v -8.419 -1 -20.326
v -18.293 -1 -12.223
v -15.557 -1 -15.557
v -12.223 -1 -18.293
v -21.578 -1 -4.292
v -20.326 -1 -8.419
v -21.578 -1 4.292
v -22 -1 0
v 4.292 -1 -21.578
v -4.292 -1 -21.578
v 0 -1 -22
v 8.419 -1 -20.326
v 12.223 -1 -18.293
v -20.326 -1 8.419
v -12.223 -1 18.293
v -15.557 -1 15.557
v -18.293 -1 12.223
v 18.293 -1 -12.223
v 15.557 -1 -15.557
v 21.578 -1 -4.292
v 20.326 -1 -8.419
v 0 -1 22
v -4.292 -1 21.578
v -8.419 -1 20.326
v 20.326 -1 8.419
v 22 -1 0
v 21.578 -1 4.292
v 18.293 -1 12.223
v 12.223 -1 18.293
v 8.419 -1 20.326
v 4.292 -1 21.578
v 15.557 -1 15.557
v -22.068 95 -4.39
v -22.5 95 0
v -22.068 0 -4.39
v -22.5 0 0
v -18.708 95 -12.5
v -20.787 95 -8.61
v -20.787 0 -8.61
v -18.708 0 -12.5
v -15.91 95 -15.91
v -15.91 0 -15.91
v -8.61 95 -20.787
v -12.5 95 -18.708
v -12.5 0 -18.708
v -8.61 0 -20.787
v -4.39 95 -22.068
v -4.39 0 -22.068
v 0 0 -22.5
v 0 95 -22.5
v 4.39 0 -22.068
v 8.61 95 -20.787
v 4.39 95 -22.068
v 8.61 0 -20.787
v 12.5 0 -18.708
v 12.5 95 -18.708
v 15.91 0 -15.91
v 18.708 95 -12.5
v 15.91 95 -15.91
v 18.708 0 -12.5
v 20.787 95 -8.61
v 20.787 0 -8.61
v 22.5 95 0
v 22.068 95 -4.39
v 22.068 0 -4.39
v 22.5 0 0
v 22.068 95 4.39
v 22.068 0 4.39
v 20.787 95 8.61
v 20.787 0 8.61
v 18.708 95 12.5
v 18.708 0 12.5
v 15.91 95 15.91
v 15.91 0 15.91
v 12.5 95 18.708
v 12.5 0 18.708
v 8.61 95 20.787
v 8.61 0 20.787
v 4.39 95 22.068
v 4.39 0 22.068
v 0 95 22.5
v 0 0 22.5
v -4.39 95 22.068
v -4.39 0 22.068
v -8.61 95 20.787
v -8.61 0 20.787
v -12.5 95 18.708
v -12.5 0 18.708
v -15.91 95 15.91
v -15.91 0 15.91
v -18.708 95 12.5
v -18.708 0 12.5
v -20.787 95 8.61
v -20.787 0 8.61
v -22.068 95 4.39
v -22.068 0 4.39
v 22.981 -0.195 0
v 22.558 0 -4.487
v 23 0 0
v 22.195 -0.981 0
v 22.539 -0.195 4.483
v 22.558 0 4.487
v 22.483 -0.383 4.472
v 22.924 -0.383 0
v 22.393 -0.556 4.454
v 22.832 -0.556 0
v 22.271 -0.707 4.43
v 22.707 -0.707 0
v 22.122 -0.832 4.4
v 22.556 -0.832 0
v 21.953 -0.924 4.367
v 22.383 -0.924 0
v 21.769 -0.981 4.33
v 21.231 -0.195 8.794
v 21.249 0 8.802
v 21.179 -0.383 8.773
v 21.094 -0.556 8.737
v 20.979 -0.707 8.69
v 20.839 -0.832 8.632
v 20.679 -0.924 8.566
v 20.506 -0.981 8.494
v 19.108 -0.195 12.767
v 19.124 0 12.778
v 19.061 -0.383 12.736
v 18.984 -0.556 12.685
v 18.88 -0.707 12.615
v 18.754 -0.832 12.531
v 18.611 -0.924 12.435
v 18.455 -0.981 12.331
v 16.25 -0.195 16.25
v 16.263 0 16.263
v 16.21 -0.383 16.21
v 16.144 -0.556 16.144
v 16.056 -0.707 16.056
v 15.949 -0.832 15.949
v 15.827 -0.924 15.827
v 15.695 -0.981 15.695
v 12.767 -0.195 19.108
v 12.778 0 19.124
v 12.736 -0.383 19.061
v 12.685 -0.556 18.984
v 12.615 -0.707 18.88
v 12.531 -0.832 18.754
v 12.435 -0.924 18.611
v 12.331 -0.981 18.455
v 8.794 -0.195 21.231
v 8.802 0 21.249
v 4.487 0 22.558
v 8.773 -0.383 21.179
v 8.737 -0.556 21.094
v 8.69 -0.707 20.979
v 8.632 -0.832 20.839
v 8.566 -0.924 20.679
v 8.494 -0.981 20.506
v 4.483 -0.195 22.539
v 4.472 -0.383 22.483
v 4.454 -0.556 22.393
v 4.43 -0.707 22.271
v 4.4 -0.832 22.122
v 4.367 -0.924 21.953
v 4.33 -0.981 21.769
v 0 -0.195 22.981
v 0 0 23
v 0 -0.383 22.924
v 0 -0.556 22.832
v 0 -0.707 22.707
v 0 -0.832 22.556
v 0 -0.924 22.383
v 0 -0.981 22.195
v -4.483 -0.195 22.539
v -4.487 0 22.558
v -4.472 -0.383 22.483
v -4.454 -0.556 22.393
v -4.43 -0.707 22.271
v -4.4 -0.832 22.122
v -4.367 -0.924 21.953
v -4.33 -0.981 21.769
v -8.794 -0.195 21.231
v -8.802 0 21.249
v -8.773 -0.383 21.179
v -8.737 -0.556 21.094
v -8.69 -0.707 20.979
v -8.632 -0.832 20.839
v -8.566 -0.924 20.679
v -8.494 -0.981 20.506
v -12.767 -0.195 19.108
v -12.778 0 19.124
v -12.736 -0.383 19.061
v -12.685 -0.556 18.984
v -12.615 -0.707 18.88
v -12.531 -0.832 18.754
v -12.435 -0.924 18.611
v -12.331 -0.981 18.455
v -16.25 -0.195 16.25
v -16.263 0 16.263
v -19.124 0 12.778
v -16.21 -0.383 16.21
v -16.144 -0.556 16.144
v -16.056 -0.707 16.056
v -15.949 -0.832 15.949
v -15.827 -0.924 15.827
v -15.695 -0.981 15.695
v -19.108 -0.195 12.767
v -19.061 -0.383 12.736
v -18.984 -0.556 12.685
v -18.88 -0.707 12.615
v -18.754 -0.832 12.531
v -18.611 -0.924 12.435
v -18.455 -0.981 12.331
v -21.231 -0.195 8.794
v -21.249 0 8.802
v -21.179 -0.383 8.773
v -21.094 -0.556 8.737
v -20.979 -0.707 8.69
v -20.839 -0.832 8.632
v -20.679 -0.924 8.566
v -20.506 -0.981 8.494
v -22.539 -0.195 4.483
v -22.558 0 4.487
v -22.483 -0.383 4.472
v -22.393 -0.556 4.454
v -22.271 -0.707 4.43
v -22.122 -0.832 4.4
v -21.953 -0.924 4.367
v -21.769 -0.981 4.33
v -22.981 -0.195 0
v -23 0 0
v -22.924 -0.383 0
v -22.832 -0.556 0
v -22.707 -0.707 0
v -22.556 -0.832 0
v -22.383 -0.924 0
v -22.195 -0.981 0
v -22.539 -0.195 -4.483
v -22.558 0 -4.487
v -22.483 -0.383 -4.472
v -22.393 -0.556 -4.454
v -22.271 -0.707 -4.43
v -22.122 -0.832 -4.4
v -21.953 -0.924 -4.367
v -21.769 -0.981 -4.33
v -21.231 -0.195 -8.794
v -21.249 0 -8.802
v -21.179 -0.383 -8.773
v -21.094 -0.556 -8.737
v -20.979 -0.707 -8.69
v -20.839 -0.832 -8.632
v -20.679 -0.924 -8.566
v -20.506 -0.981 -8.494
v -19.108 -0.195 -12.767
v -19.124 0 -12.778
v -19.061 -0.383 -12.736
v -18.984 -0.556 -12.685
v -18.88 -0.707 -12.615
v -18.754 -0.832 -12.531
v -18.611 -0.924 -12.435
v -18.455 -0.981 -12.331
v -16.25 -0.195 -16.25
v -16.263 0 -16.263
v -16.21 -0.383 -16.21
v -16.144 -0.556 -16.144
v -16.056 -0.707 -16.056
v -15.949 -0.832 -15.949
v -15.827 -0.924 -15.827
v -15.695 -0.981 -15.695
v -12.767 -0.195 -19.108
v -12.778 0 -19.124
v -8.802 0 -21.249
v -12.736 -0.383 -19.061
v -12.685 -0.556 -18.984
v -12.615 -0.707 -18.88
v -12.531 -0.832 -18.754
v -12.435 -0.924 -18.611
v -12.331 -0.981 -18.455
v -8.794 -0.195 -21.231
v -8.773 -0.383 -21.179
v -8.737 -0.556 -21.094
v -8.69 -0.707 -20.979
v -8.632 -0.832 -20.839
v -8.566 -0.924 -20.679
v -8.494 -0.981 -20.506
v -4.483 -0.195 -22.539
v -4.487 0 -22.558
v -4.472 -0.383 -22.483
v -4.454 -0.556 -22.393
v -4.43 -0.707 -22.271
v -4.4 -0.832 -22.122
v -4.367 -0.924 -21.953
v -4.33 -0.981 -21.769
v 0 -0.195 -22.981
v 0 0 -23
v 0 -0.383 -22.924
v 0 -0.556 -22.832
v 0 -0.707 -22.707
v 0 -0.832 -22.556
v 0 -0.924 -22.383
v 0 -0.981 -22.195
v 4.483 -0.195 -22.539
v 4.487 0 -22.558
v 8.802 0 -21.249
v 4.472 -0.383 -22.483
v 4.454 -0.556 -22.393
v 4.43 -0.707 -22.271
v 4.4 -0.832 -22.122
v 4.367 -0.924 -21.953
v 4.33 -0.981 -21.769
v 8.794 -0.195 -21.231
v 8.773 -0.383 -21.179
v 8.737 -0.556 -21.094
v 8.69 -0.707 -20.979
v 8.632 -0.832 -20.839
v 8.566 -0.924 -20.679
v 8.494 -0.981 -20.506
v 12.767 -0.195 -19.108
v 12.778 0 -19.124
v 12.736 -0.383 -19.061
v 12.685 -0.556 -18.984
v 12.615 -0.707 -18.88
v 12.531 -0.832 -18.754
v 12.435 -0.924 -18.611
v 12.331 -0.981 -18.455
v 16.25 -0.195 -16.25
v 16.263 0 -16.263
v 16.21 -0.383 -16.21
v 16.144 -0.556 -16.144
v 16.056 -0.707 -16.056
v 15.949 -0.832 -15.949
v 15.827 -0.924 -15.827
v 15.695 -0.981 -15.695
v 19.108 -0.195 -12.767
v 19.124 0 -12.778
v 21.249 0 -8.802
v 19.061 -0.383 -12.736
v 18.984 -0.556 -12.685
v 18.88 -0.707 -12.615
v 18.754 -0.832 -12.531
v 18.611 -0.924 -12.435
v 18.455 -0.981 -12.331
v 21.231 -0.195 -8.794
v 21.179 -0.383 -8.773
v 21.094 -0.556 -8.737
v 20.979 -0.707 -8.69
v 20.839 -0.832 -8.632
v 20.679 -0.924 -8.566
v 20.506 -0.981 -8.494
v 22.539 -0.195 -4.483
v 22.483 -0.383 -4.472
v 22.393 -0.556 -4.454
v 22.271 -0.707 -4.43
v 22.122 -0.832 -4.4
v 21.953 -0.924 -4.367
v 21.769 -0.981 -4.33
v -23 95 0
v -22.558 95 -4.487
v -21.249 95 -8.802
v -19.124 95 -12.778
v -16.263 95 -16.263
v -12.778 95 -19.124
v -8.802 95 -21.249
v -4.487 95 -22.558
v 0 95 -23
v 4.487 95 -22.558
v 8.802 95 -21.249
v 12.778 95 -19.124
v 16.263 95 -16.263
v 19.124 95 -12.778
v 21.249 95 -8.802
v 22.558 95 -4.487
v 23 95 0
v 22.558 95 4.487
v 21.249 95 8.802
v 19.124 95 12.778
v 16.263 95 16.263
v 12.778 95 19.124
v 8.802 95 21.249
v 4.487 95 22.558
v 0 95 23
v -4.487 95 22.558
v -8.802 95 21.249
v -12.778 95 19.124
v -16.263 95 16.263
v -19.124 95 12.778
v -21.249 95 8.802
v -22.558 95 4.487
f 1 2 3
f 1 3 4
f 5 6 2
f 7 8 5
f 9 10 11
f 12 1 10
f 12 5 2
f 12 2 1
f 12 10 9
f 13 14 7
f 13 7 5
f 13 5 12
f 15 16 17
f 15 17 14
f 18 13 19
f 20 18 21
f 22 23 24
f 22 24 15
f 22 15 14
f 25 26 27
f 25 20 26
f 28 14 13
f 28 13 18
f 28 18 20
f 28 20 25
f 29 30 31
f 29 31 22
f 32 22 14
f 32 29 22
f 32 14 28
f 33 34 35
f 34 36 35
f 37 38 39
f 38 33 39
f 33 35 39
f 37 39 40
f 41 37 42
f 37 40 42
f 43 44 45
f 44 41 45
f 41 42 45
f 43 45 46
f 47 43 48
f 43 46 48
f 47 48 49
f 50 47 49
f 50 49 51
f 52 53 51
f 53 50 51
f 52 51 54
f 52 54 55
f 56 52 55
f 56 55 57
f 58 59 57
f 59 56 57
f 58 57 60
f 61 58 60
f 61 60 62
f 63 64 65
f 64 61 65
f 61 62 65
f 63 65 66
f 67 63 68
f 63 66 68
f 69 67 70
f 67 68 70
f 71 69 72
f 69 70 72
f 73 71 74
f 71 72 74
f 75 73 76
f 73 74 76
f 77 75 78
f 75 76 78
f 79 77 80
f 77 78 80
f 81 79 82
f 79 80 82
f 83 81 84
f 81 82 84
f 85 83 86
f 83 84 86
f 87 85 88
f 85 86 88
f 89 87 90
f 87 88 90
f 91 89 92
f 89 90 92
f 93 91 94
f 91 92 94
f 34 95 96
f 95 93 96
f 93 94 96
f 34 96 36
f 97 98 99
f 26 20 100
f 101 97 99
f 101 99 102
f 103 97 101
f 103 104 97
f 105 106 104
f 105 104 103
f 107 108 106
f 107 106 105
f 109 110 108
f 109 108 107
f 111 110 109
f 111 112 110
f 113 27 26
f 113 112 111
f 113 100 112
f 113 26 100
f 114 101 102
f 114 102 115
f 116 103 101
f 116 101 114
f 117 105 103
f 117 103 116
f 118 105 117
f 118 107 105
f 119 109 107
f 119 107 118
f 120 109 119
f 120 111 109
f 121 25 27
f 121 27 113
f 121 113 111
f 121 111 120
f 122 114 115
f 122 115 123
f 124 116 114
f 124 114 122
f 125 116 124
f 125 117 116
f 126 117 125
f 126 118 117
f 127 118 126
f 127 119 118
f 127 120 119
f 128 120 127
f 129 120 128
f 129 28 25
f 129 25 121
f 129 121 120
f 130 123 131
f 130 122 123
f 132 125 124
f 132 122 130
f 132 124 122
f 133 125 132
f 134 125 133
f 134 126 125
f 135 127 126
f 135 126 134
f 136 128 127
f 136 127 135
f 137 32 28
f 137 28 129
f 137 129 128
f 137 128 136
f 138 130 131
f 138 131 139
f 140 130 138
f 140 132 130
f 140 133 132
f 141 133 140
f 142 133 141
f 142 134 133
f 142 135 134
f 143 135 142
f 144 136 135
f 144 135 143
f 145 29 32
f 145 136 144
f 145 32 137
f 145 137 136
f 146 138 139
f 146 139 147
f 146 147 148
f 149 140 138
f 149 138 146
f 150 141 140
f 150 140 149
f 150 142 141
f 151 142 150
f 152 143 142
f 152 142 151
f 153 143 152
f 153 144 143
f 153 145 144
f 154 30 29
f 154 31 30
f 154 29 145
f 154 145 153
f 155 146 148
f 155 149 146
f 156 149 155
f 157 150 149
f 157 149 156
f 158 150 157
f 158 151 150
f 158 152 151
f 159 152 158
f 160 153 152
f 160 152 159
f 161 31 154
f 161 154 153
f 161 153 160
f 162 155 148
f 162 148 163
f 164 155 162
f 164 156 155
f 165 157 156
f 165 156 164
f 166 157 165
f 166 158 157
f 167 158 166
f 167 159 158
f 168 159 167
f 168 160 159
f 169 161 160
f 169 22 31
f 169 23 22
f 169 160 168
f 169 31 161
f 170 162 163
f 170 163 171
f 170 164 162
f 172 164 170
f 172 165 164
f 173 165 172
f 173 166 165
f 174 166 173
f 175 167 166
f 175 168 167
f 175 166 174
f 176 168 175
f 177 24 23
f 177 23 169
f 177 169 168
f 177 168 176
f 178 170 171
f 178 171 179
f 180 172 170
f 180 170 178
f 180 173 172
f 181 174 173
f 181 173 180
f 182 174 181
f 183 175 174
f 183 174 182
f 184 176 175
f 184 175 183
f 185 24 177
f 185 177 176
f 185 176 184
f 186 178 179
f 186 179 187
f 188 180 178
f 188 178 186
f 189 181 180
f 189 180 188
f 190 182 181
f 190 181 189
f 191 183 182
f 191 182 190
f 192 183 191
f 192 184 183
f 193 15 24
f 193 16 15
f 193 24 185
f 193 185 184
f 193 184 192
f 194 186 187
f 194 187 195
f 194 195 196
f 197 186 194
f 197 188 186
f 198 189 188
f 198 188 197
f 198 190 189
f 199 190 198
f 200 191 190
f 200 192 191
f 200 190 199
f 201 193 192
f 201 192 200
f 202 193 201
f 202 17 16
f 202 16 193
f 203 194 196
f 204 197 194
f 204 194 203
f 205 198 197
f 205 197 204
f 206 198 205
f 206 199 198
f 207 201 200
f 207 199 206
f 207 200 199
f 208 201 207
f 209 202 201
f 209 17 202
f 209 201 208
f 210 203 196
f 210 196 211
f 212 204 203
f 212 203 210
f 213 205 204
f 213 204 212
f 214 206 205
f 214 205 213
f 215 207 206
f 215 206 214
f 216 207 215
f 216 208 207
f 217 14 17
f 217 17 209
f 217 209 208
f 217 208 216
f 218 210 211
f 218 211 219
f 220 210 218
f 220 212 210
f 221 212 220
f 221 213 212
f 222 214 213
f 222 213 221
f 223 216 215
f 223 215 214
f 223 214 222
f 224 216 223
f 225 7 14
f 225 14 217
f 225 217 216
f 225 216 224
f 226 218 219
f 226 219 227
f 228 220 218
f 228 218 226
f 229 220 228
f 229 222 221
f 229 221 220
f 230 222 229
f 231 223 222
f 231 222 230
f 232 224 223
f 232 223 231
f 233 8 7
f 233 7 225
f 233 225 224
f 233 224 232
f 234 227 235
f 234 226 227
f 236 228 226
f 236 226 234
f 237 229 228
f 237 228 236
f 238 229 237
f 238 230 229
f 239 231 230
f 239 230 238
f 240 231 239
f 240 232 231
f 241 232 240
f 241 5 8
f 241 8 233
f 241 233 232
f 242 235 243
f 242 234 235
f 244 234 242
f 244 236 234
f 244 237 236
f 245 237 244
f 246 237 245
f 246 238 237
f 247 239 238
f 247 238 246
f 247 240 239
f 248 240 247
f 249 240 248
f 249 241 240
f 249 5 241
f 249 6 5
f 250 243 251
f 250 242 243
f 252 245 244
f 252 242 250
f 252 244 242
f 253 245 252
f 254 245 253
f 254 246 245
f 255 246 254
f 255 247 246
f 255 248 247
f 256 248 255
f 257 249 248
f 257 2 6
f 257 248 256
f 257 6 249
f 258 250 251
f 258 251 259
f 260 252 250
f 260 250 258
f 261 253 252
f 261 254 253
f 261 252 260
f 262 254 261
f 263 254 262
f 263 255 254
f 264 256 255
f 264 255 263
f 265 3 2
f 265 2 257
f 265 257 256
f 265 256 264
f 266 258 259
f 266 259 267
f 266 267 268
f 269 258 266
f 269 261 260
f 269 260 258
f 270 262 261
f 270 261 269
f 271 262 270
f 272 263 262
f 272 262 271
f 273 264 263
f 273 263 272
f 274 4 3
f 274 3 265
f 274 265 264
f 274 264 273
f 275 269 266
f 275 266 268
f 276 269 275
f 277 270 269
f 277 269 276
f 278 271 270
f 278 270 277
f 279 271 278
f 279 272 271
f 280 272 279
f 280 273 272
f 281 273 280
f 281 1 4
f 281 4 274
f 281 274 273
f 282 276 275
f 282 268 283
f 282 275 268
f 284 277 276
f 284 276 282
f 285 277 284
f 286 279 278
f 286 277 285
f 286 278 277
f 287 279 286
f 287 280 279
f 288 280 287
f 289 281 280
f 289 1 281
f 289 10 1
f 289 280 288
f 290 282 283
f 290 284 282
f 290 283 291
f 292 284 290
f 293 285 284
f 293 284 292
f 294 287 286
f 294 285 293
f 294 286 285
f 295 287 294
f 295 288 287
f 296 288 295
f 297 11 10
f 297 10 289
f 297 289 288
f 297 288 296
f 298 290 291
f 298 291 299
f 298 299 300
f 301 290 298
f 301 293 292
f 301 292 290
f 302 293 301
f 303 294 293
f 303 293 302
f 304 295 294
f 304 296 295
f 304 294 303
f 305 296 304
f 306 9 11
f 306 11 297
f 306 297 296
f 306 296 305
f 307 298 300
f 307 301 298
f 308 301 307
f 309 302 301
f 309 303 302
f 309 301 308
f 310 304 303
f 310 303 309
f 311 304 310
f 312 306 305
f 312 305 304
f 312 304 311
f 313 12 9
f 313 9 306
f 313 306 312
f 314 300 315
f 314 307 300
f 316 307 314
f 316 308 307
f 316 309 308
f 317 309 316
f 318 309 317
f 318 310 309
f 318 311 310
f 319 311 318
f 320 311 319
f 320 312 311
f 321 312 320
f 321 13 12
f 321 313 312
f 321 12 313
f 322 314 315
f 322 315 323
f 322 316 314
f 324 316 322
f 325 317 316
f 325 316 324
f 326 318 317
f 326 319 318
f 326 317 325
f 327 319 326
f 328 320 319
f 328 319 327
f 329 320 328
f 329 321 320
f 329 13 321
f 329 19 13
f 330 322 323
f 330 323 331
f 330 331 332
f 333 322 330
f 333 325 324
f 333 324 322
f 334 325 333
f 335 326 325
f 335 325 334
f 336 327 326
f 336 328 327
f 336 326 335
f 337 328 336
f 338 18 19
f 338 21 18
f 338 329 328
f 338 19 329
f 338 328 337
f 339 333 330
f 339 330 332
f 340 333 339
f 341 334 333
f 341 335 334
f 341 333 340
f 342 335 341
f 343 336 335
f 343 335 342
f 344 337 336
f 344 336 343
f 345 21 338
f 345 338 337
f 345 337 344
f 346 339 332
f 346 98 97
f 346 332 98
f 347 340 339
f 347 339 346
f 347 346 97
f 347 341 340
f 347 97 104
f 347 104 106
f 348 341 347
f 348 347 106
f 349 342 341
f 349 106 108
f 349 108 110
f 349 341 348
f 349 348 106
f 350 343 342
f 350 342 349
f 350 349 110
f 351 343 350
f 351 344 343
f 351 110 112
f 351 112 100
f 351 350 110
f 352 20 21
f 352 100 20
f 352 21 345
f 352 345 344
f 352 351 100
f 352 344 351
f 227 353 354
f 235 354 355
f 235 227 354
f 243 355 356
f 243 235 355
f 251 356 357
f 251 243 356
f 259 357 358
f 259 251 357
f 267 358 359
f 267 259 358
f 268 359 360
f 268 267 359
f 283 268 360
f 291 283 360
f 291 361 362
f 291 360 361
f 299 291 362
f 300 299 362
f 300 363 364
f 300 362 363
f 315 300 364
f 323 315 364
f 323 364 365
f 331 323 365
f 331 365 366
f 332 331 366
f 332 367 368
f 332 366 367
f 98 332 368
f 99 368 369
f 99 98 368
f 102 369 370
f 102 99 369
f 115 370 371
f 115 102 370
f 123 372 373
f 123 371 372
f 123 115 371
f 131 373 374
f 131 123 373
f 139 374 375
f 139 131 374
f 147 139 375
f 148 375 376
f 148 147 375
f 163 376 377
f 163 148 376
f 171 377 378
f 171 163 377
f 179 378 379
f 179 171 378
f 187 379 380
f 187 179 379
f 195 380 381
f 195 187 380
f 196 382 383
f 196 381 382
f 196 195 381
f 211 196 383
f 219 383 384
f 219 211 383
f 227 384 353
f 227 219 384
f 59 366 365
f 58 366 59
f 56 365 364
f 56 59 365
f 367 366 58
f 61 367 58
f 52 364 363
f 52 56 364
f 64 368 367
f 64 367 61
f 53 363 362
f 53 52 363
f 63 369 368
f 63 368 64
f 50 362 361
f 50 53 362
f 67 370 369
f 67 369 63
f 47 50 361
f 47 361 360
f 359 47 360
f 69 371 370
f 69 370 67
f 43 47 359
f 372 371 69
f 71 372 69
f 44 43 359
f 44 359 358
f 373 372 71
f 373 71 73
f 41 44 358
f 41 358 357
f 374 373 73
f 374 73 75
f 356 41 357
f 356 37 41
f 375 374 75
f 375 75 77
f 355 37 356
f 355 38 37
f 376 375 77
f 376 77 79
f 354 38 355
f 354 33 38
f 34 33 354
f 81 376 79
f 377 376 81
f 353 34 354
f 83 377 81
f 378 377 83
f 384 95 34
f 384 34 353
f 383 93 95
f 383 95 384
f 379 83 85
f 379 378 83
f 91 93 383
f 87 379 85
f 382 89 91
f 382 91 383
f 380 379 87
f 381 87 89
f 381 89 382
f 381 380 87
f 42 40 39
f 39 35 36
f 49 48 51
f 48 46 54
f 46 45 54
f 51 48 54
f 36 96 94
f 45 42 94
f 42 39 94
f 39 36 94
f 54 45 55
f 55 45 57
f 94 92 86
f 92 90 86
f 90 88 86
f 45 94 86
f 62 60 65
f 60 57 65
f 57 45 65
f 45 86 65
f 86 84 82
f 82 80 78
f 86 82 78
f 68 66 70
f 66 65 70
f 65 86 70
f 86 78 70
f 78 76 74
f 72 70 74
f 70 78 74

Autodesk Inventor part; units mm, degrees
ref_plane "YZ Plane" through (0, 0, 0) normal (1, 0, 0) x (0, 1, 0)
ref_plane "XZ Plane" through (0, 0, 0) normal (0, 1, 0) x (-1, 0, 0)
ref_plane "XY Plane" through (0, 0, 0) normal (0, 0, 1) x (1, 0, 0)
sketch "Sketch1" plane through (0, 0, 0) normal (0, 1, 0) x (-1, 0, 0)
  circle A0 centre (0, 0) radius 22.5
  circle A1 centre (0, 0) radius 23
  dimension "d0" = 45
  dimension "d1" = 46
extrude "Extrusion1" add sketch "Sketch1" along normal blind 95
sketch "Sketch2" plane through (0, 0, 0) normal (0, -1, 0) x (1, 0, 0)
  circle A0 centre (0, 0) radius 23 projected
  circle A1 centre (0, -23) radius 0.5
  dimension "d8" = 1
sketch "Sketch3" plane through (0, 0, 0) normal (0, -1, 0) x (1, 0, 0)
  circle A0 centre (0, 0) radius 23
  dimension "d4" = 46
extrude "Extrusion2" add sketch "Sketch3" along normal blind 1
fillet "Fillet1" radius 1 1 edges at (-23, -1, 0)
properties part number "Dalek Light 2"
